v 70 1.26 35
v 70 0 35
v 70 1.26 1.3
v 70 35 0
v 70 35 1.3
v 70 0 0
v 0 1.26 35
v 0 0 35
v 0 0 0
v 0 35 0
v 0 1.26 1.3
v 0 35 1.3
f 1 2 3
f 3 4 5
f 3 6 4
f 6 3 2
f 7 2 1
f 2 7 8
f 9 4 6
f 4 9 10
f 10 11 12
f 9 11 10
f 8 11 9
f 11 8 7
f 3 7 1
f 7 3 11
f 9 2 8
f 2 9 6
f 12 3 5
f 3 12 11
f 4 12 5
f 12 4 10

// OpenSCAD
// BlendeSatReceiver.scad

//70 breit
//35 hoch
//35 tief

//Generell für "Leisten"

t1=1.26;
t2=1.3;

x=70;
y=35;
z=35;

cube([x,t1,z]);
cube([x,y,t2]);
